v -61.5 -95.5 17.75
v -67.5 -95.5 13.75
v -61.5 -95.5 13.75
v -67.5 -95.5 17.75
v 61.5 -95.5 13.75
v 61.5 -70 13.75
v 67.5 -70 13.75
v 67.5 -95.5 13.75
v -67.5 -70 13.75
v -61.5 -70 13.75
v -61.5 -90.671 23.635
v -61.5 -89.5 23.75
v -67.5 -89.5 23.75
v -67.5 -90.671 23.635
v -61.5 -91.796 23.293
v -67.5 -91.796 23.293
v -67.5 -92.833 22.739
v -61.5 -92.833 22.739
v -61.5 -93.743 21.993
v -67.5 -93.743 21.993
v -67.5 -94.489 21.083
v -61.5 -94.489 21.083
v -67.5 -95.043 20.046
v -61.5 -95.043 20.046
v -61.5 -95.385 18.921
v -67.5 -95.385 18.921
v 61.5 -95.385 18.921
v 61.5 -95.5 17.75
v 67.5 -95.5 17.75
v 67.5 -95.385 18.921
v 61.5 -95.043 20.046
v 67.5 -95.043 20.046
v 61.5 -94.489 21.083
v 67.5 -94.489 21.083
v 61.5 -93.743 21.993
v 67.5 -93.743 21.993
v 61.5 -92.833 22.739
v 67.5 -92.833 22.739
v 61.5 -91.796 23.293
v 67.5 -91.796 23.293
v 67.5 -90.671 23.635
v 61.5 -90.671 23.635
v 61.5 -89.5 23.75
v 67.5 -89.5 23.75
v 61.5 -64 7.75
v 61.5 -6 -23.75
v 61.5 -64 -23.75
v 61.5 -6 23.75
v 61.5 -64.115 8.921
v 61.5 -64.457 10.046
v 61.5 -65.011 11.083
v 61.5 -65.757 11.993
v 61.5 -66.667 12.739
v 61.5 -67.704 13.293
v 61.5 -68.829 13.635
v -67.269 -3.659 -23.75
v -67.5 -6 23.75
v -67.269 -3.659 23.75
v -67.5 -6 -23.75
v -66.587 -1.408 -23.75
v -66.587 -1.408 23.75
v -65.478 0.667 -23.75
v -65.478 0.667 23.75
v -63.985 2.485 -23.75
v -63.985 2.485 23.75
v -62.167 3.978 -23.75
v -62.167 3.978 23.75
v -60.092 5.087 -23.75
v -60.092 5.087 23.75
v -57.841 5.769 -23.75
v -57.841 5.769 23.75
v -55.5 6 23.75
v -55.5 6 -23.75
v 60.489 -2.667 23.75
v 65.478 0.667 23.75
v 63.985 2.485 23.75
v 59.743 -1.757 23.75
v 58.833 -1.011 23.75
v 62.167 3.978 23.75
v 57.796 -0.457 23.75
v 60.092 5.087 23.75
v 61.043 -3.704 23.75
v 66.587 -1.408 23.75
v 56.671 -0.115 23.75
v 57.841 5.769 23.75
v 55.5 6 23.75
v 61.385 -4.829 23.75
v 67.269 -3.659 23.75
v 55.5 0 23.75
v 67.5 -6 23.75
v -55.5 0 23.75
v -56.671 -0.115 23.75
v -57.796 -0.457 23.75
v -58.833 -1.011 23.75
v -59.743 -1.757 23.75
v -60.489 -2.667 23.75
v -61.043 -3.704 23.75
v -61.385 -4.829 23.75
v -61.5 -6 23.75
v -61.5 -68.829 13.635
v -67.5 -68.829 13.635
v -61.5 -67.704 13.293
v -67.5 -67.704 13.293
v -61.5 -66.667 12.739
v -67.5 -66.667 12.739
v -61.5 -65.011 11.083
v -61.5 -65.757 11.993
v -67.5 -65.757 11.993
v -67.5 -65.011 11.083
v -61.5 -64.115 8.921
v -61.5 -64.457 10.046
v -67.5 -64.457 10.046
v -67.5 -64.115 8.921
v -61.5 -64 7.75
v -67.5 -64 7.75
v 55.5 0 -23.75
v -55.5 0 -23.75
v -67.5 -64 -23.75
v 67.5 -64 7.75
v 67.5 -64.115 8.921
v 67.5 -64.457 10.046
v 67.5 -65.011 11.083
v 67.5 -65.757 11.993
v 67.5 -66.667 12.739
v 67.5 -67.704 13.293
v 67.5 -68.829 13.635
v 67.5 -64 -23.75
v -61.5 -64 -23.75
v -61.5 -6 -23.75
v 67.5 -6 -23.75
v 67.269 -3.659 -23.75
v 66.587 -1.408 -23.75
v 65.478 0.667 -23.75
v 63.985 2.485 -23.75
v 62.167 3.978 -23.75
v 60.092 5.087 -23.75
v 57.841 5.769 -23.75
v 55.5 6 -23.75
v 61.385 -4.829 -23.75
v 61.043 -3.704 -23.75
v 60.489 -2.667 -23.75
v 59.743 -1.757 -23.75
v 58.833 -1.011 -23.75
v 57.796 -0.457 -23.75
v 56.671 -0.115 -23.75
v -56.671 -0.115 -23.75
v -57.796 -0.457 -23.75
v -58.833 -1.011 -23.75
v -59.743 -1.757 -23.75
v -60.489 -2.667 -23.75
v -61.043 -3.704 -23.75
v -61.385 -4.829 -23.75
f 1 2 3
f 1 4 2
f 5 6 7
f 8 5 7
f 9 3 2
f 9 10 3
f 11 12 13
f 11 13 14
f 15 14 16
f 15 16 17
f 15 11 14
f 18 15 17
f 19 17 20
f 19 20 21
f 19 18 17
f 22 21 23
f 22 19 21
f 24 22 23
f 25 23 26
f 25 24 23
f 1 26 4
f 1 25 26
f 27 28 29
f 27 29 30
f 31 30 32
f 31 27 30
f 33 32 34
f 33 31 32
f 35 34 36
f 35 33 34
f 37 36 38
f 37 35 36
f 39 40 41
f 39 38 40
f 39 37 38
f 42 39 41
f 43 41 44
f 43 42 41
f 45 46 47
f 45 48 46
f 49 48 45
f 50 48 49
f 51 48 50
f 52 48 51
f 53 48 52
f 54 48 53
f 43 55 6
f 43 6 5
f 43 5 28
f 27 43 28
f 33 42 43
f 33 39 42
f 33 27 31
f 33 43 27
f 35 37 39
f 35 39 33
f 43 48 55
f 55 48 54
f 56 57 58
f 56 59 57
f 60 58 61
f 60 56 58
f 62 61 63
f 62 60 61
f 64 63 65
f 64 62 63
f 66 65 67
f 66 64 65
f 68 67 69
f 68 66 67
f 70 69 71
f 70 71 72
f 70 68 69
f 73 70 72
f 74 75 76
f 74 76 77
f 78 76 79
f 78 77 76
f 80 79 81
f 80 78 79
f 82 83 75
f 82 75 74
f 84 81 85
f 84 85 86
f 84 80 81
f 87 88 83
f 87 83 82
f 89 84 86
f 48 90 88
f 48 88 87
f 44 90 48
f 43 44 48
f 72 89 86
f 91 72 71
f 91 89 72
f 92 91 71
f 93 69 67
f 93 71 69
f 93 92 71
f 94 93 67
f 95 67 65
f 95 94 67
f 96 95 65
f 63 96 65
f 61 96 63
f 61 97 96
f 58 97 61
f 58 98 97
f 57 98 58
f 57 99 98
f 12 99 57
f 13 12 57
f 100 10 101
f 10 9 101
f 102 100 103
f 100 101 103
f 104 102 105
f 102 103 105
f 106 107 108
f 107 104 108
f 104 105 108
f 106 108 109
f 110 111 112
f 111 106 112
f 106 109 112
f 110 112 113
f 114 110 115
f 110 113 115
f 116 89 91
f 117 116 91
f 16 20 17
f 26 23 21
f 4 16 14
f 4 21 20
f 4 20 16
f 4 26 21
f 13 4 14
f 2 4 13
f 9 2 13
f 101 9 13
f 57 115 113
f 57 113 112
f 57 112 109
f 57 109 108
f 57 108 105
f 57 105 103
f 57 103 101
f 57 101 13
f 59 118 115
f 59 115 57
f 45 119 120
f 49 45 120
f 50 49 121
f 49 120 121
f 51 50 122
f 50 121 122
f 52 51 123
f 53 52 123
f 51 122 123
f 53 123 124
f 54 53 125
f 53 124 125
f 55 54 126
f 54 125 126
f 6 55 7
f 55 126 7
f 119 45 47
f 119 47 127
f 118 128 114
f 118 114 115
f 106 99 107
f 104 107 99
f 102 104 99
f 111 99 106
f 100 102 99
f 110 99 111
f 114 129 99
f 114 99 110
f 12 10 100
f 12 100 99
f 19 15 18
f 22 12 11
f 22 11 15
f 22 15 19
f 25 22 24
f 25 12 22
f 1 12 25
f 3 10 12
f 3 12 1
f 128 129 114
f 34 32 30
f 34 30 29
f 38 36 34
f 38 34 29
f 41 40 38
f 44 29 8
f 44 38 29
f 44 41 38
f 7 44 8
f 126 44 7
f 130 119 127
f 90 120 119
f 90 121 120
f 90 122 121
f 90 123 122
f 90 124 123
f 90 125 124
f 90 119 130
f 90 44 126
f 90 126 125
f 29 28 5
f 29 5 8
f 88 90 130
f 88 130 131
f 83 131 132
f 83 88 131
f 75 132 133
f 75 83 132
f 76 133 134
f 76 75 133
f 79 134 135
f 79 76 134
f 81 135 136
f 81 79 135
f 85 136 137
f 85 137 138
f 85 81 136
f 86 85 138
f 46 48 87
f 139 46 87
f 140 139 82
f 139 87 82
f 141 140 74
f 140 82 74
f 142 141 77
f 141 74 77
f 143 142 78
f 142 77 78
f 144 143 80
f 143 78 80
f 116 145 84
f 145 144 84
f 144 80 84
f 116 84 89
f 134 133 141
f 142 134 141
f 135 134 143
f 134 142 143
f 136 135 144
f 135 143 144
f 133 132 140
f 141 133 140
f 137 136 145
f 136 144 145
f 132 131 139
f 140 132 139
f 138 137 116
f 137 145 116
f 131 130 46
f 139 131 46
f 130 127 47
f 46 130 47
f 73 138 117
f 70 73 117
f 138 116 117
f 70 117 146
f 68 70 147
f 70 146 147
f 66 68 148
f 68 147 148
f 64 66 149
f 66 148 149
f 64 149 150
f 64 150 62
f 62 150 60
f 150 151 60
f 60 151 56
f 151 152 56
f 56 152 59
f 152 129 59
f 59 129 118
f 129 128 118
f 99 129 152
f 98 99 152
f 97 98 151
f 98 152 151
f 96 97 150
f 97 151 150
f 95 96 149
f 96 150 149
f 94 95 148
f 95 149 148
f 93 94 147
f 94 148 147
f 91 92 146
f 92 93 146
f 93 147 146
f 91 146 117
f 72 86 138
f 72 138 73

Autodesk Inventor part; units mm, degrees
ref_plane "YZ Plane" through (0, 0, 0) normal (1, 0, 0) x (0, 1, 0)
ref_plane "XZ Plane" through (0, 0, 0) normal (0, 1, 0) x (-1, 0, 0)
ref_plane "XY Plane" through (0, 0, 0) normal (0, 0, 1) x (1, 0, 0)
sketch "Náčrt2" plane through (0, 0, 0) normal (0, 1, 0) x (-1, 0, 0)
  line L0 (67.5, 23.75) -> (-67.5, 23.75)
  line L1 (-67.5, 23.75) -> (-67.5, -23.75)
  line L2 (-67.5, -23.75) -> (67.5, -23.75)
  line L3 (67.5, -23.75) -> (67.5, 23.75)
  point P0 (0, 0)
  point P1 (67.5, 0)
  point P2 (0, 23.75)
  dimension "d0" = 135
  dimension "d1" = 47.5
extrude "Vysunutí1" add sketch "Náčrt2" along normal blind 6
sketch "Náčrt3" plane through (61.5, 6, 23.75) normal (1, 0, 0) x (0, 1, 0)
  line L0 (0, -47.5) -> (0, 0)
  line L1 (0, 0) -> (-70, 0)
  line L2 (-70, 0) -> (-70, -47.5)
  line L3 (-70, -47.5) -> (0, -47.5)
edge flange "Obruba1" height 70 angle 90 thickness 6 bend radius 6 thickness toward (1, 0, 0) relief tear relief width 6 relief depth 3 corner gap 6 corner form 0 edges at (67.5, 0, 0) (-67.5, 0, 0) wall of the first edge with corners at (61.5, 6, -23.75) (61.5, 6, 23.75) (61.5, -64, 23.75) (61.5, -64, -23.75)
bend "Ohyb1"
corner "Roh1"
sketch "Náčrt4" plane through (-67.5, -64, -23.75) normal (0, -1, 0) x (1, 0, 0)
  line L0 (0, 47.5) -> (0, 0) construction
  line L1 (6, 0) -> (0, 0) construction
  line L2 (6, 47.5) -> (6, 0) construction
  line L3 (6, 47.5) -> (0, 47.5) construction
  line L4 (135, 0) -> (135, 47.5) construction
  line L5 (129, 47.5) -> (135, 47.5) construction
  line L6 (129, 0) -> (129, 47.5) construction
  line L7 (129, 0) -> (135, 0) construction
  line L8 (0, 47.5) -> (0, 0) projected
  line L9 (0, 47.5) -> (6, 47.5)
  line L10 (6, 47.5) -> (6, 37.5)
  line L11 (6, 37.5) -> (0, 37.5)
  line L12 (0, 37.5) -> (0, 47.5)
  line L13 (135, 47.5) -> (129, 47.5)
  line L14 (129, 47.5) -> (129, 37.5)
  line L15 (129, 37.5) -> (135, 37.5)
  line L16 (135, 37.5) -> (135, 47.5)
  point P0 (67.5, 23.75)
  dimension "d18" = 10
extrude "Vysunutí2" add sketch "Náčrt4" along normal blind 31.5
fillet "Zaoblení2" radius 6 4 edges at (64.5, -64, 13.75) (-64.5, -64, 13.75) (-64.5, -95.5, 23.75) (64.5, -95.5, 23.75)
equation "\"d4\" = ŠířkaVýštipu"
equation "\"d5\" = HloubkaVýštipu"
equation "\"d6\" = MinimálníZbytek"
equation "\"d7\" = PoloměrOhybu"
equation "\"d10\" = PoloměrOhybu"
equation "\"d11\" = VelikostRohovéhoVýštipu"
equation "\"d12\" = VelikostMezery"
equation "\"d13\" = VelikostJacobihoPoloměru"
equation "\"PoloměrOhybu\" = Tloušťka"
equation "\"ŠířkaVýštipu\" = Tloušťka"
equation "\"HloubkaVýštipu\" = 0.5 * Tloušťka"
equation "\"VelikostRohovéhoVýštipu\" = 4 * Tloušťka"
equation "\"MinimálníZbytek\" = 2 * Tloušťka"
equation "\"PřechodovýPoloměr\" = PoloměrOhybu"
equation "\"VelikostJacobihoPoloměru\" = PoloměrOhybu"
equation "\"VelikostMezery\" = Tloušťka"
equation "\"Tloušťka\" = 6"
properties part number "DD_KVD_002_05" material "Nerezová ocel"
